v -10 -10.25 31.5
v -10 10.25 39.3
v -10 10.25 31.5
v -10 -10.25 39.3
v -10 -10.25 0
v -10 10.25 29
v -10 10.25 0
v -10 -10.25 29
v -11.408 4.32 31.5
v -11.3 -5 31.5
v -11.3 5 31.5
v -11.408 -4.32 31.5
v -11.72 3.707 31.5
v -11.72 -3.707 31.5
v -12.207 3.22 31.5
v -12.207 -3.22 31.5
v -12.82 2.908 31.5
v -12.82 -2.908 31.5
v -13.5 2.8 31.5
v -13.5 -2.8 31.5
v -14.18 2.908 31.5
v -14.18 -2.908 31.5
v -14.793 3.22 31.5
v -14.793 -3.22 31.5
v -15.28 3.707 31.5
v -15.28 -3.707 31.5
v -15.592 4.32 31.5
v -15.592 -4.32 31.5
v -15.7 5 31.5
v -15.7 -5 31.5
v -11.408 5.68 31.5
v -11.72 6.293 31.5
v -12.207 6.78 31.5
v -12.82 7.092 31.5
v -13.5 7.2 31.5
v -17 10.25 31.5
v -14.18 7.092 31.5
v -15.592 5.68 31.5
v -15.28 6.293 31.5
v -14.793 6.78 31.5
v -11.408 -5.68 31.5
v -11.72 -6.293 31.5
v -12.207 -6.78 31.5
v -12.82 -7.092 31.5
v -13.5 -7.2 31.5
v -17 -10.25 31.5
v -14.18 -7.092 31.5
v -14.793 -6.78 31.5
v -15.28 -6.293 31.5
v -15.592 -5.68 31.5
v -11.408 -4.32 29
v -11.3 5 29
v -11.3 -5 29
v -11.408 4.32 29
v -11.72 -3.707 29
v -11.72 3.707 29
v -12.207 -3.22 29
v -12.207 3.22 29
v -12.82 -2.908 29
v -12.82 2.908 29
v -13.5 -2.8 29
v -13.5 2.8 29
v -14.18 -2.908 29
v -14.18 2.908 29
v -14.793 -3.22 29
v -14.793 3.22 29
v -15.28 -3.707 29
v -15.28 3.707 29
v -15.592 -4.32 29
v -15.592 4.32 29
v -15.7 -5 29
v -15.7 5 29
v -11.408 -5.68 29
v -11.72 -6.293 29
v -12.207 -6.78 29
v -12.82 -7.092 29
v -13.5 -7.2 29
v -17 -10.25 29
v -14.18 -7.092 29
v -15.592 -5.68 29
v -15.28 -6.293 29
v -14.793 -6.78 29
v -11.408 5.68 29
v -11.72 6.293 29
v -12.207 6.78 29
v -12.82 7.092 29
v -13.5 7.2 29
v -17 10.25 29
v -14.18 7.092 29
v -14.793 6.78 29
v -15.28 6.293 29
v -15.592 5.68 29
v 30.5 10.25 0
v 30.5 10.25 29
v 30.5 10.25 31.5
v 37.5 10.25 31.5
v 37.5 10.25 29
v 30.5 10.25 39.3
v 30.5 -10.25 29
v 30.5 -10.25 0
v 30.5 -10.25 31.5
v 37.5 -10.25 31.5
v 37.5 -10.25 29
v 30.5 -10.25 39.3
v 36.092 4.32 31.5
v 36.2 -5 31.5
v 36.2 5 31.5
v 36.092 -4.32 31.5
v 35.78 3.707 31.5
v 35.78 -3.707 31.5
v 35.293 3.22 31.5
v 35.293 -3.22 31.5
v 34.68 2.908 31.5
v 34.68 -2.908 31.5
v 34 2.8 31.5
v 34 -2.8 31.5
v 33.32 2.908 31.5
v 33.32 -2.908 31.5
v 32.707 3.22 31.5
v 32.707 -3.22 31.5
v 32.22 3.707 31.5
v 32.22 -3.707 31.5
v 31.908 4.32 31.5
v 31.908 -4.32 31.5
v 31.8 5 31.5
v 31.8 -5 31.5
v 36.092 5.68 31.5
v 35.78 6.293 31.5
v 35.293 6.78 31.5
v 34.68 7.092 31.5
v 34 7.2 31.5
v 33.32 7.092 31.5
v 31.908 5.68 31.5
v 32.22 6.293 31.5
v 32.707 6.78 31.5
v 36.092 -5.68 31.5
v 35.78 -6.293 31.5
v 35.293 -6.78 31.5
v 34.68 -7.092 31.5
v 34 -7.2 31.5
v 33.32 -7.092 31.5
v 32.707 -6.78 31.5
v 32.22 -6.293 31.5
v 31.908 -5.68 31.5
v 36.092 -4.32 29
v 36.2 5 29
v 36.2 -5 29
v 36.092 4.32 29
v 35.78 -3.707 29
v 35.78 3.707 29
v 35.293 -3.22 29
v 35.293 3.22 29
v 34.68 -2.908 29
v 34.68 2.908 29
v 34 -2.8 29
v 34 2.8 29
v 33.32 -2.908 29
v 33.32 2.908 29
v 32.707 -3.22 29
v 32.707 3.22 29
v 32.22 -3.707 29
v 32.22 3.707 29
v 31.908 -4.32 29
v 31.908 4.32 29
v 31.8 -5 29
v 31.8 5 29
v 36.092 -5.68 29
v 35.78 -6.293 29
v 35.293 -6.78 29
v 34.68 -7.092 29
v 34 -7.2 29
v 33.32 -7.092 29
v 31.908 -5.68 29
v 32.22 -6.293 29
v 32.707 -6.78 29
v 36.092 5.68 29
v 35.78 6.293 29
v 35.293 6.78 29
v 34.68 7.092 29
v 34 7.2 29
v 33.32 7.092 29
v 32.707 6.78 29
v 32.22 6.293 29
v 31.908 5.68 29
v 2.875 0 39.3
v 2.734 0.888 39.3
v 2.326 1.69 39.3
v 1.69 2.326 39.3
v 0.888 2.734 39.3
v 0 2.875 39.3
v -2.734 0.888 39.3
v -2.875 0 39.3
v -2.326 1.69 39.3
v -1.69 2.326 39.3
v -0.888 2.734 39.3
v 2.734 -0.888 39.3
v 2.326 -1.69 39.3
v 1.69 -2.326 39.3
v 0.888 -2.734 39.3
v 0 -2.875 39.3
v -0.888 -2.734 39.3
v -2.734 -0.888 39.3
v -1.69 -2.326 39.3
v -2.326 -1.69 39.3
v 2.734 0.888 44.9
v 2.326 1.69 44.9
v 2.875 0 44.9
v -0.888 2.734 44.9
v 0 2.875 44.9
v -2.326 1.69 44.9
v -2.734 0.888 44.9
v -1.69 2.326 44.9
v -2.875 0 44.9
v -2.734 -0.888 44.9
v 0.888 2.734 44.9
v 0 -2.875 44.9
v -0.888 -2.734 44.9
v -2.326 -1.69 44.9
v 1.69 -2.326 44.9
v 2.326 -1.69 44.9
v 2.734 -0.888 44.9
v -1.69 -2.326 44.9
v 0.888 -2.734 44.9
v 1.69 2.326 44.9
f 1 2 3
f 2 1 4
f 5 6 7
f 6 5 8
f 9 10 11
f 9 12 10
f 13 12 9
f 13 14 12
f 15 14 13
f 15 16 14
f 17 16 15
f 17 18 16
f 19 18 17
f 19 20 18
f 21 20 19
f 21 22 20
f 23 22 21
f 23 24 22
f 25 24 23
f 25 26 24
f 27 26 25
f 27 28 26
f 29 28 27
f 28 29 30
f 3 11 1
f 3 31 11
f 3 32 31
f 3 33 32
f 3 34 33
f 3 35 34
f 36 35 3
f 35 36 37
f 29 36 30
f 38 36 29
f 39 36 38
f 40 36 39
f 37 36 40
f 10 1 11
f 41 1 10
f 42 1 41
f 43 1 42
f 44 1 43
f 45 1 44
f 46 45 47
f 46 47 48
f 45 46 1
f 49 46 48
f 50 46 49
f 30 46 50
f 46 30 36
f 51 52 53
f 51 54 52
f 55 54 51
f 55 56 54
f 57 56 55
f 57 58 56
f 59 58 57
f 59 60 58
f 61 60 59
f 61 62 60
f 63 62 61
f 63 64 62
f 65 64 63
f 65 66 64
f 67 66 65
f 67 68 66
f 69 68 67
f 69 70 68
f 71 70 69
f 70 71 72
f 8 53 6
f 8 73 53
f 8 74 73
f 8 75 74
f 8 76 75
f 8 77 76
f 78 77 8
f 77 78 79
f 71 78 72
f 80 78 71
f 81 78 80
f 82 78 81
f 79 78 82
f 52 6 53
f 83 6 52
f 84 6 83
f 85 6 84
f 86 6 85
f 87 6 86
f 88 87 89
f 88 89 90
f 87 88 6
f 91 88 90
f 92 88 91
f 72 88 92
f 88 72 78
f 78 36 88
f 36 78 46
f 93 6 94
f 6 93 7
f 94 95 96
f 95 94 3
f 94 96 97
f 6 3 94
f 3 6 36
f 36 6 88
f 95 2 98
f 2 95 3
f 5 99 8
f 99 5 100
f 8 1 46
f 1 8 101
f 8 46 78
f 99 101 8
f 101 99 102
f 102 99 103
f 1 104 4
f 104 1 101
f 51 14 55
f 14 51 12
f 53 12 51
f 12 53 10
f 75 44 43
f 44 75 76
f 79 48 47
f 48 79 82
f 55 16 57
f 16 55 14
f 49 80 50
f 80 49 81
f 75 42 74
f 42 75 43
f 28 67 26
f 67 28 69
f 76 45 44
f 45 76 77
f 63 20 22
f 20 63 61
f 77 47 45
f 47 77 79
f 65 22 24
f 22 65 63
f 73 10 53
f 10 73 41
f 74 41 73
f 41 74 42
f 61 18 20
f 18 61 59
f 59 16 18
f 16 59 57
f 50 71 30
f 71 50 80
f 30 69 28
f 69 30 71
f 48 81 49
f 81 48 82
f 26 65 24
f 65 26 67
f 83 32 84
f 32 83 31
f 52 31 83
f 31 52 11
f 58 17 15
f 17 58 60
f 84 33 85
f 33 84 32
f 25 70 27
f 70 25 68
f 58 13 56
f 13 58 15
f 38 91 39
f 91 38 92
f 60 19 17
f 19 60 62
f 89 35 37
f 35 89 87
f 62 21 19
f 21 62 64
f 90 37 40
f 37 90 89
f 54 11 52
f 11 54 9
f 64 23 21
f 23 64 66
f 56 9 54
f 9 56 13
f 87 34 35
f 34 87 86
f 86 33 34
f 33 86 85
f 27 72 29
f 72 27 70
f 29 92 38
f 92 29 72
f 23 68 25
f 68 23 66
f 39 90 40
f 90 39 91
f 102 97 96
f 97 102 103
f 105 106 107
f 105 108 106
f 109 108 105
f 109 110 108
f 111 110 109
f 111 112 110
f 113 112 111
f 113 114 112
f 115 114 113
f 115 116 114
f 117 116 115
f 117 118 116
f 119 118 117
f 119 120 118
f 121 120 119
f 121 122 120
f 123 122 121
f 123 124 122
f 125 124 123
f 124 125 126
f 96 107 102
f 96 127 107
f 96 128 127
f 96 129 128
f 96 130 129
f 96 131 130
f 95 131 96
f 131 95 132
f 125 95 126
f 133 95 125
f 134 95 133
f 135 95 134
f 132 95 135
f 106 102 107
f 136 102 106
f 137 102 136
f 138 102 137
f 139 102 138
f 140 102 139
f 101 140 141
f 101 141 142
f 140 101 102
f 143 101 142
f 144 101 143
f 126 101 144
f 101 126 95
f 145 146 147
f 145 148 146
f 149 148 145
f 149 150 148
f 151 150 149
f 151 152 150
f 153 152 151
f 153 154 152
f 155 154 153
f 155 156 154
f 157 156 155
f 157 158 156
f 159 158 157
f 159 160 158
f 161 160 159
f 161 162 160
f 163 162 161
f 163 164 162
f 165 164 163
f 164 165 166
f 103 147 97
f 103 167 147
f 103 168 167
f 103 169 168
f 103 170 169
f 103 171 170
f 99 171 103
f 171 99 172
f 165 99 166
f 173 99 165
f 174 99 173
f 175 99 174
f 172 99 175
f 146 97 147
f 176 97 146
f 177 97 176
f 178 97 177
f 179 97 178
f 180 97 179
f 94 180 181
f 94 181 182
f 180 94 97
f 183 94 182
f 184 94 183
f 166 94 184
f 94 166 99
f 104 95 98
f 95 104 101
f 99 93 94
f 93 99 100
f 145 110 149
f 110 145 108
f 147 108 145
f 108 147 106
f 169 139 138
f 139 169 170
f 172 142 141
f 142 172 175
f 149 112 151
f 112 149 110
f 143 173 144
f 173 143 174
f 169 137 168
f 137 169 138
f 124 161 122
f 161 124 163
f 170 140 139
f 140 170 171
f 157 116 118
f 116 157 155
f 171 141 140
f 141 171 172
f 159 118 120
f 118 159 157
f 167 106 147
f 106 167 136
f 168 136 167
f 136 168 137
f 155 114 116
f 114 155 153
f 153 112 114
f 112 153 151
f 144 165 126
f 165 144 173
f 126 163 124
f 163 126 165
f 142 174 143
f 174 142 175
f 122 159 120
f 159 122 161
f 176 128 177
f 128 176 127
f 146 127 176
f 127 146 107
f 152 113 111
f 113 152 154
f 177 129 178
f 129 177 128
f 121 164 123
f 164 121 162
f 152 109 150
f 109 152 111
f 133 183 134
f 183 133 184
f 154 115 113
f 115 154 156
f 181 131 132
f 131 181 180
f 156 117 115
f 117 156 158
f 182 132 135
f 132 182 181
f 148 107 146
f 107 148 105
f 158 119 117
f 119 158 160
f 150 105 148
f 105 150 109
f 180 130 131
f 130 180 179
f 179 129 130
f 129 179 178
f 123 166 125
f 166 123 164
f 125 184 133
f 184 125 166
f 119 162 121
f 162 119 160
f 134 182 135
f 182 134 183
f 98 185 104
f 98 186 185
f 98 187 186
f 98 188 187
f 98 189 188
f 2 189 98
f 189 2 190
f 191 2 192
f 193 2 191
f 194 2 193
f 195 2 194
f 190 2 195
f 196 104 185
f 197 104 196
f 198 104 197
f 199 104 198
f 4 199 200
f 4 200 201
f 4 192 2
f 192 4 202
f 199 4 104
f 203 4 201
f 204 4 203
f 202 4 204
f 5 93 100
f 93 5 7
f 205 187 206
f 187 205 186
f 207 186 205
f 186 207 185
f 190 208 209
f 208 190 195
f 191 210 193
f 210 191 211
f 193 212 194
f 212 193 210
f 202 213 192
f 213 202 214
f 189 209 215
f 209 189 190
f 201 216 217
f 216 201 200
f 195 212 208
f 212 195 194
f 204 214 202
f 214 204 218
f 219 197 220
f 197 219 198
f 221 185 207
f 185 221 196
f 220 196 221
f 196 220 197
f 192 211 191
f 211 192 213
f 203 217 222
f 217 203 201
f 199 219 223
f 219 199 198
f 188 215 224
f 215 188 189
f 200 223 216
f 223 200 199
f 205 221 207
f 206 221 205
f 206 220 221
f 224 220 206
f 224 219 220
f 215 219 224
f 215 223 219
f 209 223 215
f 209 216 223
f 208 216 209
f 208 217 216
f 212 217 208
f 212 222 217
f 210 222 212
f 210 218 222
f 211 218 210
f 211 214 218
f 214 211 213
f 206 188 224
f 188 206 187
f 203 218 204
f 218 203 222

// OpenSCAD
/********************
model of mg996r servo
*********************/

//dimensions of central box (excluding the pads)
//height is including the proruding neck around the shaft
length = 40.5;
width = 20.5;
height = 39.3;

//distance from nearest wall to the motor shaft
wall_to_shaft = 10;

//self explanatory measuremets
//hole_length = 48;
hole_distance = 10;
hole_diameter = 4.4;

//height is from ground to bottom of pad
pad_height = 29;
//self explanatory
pad_thick = 2.5;
pad_length = 7;

shaft_height = 5.6;
shaft_diameter = 5.75;

//convexity of holes
$fn = 20;

function servo_top() = height + shaft_height;
function servo_width() = width;
function servo_length() = length;
function servo_height() = height;
function servo_shaft_to_pad() = height - pad_height + shaft_height;
function servo_shaft_to_wall() = wall_to_shaft;
function servo_pad_height() = pad_height;
function servo_pad_length() = pad_length;
function servo_pad_hole_distance() = hole_distance;
function servo_shaft_diameter() = shaft_diameter;

module pad(){
    difference(){
        cube([pad_length, width, pad_thick]);
        translate([pad_length/2, width/2-hole_distance/2, -0.5])
        cylinder(d=hole_diameter,h=pad_thick + 1);
        translate([pad_length/2, width/2+hole_distance/2, -0.5])
        cylinder(d=hole_diameter,h=pad_thick + 1);
    }
}

module servo(){
    translate([-wall_to_shaft, -width / 2, 0])
    union() {
      color("lightgrey")
      translate([-pad_length,0,pad_height])
      pad();

      color("lightgrey")
      translate([length,0,pad_height])
      pad();

      color("darkgrey")
      cube([length, width, height]);
      
      color("lightgrey")
      translate([wall_to_shaft, width/2, height])
      cylinder(h=shaft_height,d=shaft_diameter);
    }
}

servo();
